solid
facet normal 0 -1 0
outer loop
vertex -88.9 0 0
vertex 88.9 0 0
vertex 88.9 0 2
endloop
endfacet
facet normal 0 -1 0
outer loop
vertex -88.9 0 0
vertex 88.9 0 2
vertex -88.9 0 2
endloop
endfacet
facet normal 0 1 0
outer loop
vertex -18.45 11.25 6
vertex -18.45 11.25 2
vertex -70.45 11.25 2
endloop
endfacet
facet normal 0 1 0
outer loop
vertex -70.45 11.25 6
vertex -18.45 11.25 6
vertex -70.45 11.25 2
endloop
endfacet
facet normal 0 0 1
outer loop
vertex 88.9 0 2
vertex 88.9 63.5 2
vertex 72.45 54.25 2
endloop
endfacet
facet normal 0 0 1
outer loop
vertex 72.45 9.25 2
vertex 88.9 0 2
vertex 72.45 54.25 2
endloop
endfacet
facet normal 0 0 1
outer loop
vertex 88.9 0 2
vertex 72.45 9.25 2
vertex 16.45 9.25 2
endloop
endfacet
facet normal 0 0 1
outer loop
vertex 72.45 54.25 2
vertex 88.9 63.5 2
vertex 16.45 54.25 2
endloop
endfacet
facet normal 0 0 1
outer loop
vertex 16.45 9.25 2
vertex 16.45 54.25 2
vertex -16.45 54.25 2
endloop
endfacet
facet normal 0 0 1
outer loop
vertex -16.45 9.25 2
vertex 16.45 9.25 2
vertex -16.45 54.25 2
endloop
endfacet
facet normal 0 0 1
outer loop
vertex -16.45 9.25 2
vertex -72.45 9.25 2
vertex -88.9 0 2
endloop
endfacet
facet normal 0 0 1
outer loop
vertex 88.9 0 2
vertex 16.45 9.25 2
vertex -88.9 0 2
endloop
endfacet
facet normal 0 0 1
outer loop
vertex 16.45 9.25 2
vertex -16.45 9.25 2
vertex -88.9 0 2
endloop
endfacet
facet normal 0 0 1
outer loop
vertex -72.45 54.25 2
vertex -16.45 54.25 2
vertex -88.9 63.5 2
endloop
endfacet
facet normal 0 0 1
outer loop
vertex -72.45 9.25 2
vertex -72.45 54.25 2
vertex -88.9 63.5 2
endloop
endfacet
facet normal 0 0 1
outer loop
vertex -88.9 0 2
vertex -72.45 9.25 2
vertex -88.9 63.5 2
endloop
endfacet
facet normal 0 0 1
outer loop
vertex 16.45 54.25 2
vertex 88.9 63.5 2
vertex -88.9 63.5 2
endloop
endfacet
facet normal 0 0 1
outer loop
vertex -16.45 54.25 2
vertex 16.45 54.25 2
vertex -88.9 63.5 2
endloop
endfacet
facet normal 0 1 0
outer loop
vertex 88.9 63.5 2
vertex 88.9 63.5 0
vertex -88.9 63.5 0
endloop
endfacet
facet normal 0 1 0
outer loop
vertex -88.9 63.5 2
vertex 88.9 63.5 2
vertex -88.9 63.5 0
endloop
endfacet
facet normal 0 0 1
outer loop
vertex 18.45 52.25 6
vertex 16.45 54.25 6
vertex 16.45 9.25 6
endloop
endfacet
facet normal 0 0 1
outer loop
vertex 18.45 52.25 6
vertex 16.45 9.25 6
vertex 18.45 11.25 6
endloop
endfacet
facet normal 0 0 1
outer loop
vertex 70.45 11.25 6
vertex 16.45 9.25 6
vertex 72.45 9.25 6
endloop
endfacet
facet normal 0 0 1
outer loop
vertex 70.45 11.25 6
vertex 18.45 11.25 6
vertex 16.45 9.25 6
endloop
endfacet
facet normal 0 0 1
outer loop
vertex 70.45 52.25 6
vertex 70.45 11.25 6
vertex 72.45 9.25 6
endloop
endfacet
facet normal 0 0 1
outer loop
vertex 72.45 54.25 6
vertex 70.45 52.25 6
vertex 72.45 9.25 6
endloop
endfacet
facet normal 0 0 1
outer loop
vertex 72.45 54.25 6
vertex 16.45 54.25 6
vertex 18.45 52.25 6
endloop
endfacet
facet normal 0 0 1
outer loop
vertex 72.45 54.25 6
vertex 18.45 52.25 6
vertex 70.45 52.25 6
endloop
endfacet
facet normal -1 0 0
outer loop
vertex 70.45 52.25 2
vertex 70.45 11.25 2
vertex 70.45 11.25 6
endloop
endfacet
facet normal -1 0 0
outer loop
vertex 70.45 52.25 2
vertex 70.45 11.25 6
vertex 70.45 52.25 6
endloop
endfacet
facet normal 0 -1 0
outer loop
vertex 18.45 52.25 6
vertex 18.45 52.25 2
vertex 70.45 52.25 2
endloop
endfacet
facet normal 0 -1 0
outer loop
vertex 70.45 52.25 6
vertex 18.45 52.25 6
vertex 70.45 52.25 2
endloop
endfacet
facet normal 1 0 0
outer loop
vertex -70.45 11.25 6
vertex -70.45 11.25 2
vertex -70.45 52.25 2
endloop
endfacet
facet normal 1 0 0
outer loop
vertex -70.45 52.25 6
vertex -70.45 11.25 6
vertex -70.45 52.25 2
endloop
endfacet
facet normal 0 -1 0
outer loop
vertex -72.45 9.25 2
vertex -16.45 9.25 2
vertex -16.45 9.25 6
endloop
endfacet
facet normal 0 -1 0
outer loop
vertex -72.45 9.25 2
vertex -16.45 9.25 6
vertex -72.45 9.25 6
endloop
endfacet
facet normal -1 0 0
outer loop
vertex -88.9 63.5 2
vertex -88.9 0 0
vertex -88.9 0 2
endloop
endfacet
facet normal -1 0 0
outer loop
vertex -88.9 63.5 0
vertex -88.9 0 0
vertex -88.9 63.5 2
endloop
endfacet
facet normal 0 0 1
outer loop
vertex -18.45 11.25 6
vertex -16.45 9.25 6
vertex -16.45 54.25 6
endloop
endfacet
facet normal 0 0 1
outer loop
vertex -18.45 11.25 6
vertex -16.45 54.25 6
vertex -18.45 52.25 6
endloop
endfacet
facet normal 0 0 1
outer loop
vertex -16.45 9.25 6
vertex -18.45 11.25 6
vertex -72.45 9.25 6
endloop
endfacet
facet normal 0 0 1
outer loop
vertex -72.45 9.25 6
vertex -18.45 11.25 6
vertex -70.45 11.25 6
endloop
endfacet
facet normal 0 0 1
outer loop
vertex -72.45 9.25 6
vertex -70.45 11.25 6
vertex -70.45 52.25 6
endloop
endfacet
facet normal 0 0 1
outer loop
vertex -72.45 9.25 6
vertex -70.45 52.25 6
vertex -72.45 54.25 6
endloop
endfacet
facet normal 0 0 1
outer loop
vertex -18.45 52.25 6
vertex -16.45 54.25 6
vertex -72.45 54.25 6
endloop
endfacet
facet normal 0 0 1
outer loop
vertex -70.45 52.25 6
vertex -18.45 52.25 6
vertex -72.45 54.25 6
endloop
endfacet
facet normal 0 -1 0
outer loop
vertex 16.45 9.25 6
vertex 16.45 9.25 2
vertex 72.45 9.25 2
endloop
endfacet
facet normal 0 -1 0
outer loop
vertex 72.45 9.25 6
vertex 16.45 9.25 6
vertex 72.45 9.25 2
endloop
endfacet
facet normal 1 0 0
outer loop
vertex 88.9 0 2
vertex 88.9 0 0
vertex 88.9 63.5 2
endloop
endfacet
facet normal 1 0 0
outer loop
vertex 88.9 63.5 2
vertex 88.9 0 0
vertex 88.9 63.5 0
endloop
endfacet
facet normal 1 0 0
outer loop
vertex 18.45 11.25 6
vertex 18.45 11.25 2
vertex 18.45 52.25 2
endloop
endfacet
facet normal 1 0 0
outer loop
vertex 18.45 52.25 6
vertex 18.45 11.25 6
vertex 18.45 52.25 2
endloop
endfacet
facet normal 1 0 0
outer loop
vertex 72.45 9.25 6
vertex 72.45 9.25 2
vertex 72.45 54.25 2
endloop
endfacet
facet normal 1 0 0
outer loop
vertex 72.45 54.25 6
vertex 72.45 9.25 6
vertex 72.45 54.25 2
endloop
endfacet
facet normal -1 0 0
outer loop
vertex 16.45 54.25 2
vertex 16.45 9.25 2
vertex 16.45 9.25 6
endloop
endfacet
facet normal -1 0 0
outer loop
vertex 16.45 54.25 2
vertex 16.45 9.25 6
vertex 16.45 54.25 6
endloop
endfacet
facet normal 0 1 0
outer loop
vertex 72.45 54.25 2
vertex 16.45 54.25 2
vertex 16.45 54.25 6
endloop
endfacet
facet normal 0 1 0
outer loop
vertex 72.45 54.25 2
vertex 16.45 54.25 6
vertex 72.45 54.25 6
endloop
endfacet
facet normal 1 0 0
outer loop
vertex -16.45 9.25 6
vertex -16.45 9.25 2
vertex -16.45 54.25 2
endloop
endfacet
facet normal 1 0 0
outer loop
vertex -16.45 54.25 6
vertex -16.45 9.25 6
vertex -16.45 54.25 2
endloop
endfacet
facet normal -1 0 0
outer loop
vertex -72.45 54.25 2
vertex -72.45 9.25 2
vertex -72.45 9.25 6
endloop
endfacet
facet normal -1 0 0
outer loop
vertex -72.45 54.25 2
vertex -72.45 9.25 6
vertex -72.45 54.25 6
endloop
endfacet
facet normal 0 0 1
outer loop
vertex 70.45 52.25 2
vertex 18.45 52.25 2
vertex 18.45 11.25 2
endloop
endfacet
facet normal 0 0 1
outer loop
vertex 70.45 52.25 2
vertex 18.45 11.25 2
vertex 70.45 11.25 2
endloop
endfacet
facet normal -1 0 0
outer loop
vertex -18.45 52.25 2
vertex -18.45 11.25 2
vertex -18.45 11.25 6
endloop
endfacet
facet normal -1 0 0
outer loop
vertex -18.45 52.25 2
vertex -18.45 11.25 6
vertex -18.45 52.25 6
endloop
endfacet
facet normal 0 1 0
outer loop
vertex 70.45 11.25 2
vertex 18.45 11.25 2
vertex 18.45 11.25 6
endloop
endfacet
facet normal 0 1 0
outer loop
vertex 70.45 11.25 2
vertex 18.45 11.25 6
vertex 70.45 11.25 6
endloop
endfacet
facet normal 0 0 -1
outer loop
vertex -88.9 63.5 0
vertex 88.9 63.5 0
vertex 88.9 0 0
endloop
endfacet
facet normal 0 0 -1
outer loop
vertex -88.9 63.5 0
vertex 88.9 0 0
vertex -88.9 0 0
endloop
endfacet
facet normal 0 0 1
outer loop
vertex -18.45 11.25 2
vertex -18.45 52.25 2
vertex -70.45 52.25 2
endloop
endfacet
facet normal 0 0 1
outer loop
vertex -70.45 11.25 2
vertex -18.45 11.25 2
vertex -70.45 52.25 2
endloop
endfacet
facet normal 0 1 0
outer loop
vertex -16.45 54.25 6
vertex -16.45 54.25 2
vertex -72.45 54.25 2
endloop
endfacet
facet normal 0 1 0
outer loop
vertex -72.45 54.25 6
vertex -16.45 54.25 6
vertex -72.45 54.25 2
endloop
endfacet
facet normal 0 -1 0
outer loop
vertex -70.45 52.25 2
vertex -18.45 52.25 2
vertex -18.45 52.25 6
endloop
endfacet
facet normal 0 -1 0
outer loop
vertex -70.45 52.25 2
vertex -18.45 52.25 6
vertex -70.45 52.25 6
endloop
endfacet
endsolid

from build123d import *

# Parameters (mm, degrees)
F0_W     = 56
F0_H     = 45
F0_W_2   = 52
F0_H_2   = 41
F1_DEPTH = 6
F0_W_3   = 88.9
F0_H_3   = 63.5
F2_DEPTH = 2
F3_DEPTH = 2


with BuildPart() as f1:
    # F0 (on Top) → F1 (new body)
    with BuildSketch(Plane.XY):
        with Locations((44.45, 31.75)):
            Rectangle(F0_W, F0_H)
        with Locations((44.45, 31.75)):
            Rectangle(F0_W_2, F0_H_2, mode=Mode.SUBTRACT)
    extrude(amount=F1_DEPTH)

    # F0 (on Top) → F2 (join)
    with BuildSketch(Plane.XY):
        with Locations((44.45, 31.75)):
            Rectangle(F0_W_3, F0_H_3)
        with Locations((44.45, 31.75)):
            Rectangle(F0_W, F0_H, mode=Mode.SUBTRACT)
    extrude(amount=F2_DEPTH)

    # F0 (on Top) → F3 (join)
    with BuildSketch(Plane.XY):
        with Locations((44.45, 31.75)):
            Rectangle(F0_W_2, F0_H_2)
    extrude(amount=F3_DEPTH)

    # F4: F1 across plane


with BuildPart() as f1_1:
    add(f1.part)
    add(f1.part.mirror(Plane.YZ))


solid = f1_1.part
